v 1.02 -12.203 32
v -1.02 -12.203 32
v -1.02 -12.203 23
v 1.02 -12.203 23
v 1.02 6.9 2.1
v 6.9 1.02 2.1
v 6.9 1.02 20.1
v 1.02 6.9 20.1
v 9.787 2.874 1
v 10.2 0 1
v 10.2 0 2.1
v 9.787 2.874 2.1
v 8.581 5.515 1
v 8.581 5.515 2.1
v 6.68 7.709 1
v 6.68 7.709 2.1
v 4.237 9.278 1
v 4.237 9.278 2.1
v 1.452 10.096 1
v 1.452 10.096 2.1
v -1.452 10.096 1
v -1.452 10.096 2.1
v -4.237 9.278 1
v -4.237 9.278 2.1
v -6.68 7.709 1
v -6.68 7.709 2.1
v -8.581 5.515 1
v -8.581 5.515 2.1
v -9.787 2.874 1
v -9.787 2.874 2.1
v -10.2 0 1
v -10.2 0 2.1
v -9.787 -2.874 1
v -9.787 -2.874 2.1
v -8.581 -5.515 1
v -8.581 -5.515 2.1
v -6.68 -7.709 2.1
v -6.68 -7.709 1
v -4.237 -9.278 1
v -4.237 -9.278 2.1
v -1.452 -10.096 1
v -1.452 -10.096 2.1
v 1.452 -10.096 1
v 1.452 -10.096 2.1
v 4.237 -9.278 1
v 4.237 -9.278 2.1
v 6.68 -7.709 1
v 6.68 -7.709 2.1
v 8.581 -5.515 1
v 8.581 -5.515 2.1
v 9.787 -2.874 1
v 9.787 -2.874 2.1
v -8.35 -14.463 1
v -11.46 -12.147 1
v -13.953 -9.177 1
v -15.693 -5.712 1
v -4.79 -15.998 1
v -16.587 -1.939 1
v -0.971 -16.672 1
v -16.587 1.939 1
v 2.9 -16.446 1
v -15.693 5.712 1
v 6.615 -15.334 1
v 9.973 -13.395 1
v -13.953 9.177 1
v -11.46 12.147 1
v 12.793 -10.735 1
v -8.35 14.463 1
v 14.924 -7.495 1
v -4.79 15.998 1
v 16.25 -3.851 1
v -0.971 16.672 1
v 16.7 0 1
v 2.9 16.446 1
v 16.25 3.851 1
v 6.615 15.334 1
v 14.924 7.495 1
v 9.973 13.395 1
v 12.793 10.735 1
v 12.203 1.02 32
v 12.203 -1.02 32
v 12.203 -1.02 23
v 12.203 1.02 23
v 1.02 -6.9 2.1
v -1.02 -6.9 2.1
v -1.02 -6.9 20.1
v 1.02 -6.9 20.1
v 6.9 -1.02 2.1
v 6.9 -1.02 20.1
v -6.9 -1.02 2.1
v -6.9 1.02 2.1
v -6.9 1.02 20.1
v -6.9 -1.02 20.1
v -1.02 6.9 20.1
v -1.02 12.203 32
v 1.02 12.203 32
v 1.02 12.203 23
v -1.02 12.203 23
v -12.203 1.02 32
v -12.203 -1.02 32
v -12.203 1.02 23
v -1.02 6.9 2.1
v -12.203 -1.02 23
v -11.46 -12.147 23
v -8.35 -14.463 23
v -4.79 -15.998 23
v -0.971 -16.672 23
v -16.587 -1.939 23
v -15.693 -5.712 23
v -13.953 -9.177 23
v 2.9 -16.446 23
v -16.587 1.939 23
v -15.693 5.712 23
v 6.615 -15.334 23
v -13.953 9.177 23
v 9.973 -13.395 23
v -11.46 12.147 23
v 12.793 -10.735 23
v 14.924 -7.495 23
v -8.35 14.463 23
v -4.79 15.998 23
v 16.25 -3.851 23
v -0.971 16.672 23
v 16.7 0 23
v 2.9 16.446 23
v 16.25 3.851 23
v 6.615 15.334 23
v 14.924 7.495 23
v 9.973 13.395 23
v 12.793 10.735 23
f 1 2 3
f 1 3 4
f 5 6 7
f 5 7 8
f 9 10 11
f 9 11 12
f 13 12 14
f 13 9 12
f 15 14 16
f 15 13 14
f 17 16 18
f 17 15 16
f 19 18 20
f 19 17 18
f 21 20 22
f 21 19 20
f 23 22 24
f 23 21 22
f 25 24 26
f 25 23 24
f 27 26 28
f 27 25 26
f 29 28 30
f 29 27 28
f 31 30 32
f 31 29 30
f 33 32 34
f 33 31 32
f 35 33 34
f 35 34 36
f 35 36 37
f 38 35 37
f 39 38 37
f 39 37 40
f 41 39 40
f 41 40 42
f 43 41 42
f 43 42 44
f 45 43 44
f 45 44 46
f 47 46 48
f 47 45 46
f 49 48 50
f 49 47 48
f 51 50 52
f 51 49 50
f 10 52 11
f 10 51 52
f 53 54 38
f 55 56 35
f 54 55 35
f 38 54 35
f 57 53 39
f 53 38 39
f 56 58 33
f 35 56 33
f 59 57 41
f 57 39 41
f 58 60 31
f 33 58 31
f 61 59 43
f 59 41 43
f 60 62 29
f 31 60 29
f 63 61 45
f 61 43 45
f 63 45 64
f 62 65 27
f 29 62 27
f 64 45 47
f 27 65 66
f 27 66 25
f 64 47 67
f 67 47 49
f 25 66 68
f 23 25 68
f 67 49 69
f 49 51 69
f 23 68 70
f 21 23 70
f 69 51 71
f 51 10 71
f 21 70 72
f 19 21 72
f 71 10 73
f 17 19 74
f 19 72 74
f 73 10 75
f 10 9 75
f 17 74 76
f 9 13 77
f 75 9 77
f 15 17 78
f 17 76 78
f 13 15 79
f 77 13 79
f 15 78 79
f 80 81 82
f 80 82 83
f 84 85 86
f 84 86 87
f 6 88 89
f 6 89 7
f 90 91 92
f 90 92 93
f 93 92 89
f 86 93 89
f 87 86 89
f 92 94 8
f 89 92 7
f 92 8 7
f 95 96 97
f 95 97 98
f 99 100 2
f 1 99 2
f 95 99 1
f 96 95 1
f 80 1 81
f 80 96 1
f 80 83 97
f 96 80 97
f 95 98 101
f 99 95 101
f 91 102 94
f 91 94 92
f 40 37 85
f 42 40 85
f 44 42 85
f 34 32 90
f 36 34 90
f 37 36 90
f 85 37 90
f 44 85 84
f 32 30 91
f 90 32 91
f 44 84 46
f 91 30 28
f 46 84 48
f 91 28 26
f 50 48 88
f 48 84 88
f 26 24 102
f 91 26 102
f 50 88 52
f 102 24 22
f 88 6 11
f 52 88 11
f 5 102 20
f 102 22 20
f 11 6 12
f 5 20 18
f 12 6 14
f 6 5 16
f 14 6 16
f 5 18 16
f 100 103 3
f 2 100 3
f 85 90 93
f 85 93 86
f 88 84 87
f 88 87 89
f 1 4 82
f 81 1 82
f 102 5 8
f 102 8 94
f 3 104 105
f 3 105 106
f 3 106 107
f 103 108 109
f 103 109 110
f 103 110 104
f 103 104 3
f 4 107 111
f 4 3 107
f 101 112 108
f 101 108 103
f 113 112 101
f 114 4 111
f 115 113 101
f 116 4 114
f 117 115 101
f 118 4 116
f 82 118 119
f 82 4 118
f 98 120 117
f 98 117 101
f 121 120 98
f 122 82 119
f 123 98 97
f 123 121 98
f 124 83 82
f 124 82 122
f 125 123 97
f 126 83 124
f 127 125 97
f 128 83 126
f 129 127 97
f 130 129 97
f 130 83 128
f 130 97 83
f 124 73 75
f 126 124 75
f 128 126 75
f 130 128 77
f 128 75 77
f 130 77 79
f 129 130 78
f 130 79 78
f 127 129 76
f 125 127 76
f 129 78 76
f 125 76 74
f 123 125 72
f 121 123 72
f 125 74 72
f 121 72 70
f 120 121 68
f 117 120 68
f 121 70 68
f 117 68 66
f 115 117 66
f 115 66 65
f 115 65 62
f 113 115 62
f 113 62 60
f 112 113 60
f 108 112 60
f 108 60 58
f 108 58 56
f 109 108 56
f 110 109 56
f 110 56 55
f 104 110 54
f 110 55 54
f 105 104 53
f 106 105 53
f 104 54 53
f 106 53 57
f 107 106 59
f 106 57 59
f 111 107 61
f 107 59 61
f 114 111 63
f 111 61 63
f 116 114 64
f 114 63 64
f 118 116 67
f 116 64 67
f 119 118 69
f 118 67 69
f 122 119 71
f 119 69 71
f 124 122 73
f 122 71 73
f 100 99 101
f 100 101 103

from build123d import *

# Parameters (mm, degrees)
REPLACEABLE_START                           = 1
SKETCH1_R                                   = 16.7
REPLACEABLE_DRIVE_INSERT_BODY_DEPTH         = 22
COMMON_START                                = 23
COMMON_POSITIVE_DRIVE_TANG_DEPTH            = 9
VALVE_START                                 = 1
VALVE_STEM_SOCKET_NOMINAL_FLATS_11_MM_DEPTH = 19.1
STEM_START                                  = 1
SKETCH4_R                                   = 10.2
STEM_CORNER_CLEARANCE_AT_ENTRY_DEPTH        = 1.1


with BuildPart() as part:
    # Sketch1 → Replaceable drive insert body (new body)
    with BuildSketch(Plane.XY.offset(REPLACEABLE_START)):
        Circle(SKETCH1_R)
    extrude(amount=REPLACEABLE_DRIVE_INSERT_BODY_DEPTH)

    # Sketch2 → Common positive drive tang (add)
    with BuildSketch(Plane.XY.offset(COMMON_START)):
        Polygon((1.02, 12.202896808), (-1.02, 12.202896808), (-12.202896808, 1.02), (-12.202896808, -1.02), (-1.02, -12.202896808), (1.02, -12.202896808), (12.202896808, -1.02), (12.202896808, 1.02), align=None)
    extrude(amount=COMMON_POSITIVE_DRIVE_TANG_DEPTH)

    # Sketch3 → Valve stem socket, nominal flats 11 mm (cut)
    with BuildSketch(Plane.XY.offset(VALVE_START)):
        Polygon((1.02, 6.899595949), (-1.02, 6.899595949), (-6.899595949, 1.02), (-6.899595949, -1.02), (-1.02, -6.899595949), (1.02, -6.899595949), (6.899595949, -1.02), (6.899595949, 1.02), align=None)
    extrude(amount=VALVE_STEM_SOCKET_NOMINAL_FLATS_11_MM_DEPTH, mode=Mode.SUBTRACT)

    # Sketch4 → Stem corner clearance at entry (cut)
    with BuildSketch(Plane.XY.offset(STEM_START)):
        Circle(SKETCH4_R)
    extrude(amount=STEM_CORNER_CLEARANCE_AT_ENTRY_DEPTH, mode=Mode.SUBTRACT)


solid = part.part
